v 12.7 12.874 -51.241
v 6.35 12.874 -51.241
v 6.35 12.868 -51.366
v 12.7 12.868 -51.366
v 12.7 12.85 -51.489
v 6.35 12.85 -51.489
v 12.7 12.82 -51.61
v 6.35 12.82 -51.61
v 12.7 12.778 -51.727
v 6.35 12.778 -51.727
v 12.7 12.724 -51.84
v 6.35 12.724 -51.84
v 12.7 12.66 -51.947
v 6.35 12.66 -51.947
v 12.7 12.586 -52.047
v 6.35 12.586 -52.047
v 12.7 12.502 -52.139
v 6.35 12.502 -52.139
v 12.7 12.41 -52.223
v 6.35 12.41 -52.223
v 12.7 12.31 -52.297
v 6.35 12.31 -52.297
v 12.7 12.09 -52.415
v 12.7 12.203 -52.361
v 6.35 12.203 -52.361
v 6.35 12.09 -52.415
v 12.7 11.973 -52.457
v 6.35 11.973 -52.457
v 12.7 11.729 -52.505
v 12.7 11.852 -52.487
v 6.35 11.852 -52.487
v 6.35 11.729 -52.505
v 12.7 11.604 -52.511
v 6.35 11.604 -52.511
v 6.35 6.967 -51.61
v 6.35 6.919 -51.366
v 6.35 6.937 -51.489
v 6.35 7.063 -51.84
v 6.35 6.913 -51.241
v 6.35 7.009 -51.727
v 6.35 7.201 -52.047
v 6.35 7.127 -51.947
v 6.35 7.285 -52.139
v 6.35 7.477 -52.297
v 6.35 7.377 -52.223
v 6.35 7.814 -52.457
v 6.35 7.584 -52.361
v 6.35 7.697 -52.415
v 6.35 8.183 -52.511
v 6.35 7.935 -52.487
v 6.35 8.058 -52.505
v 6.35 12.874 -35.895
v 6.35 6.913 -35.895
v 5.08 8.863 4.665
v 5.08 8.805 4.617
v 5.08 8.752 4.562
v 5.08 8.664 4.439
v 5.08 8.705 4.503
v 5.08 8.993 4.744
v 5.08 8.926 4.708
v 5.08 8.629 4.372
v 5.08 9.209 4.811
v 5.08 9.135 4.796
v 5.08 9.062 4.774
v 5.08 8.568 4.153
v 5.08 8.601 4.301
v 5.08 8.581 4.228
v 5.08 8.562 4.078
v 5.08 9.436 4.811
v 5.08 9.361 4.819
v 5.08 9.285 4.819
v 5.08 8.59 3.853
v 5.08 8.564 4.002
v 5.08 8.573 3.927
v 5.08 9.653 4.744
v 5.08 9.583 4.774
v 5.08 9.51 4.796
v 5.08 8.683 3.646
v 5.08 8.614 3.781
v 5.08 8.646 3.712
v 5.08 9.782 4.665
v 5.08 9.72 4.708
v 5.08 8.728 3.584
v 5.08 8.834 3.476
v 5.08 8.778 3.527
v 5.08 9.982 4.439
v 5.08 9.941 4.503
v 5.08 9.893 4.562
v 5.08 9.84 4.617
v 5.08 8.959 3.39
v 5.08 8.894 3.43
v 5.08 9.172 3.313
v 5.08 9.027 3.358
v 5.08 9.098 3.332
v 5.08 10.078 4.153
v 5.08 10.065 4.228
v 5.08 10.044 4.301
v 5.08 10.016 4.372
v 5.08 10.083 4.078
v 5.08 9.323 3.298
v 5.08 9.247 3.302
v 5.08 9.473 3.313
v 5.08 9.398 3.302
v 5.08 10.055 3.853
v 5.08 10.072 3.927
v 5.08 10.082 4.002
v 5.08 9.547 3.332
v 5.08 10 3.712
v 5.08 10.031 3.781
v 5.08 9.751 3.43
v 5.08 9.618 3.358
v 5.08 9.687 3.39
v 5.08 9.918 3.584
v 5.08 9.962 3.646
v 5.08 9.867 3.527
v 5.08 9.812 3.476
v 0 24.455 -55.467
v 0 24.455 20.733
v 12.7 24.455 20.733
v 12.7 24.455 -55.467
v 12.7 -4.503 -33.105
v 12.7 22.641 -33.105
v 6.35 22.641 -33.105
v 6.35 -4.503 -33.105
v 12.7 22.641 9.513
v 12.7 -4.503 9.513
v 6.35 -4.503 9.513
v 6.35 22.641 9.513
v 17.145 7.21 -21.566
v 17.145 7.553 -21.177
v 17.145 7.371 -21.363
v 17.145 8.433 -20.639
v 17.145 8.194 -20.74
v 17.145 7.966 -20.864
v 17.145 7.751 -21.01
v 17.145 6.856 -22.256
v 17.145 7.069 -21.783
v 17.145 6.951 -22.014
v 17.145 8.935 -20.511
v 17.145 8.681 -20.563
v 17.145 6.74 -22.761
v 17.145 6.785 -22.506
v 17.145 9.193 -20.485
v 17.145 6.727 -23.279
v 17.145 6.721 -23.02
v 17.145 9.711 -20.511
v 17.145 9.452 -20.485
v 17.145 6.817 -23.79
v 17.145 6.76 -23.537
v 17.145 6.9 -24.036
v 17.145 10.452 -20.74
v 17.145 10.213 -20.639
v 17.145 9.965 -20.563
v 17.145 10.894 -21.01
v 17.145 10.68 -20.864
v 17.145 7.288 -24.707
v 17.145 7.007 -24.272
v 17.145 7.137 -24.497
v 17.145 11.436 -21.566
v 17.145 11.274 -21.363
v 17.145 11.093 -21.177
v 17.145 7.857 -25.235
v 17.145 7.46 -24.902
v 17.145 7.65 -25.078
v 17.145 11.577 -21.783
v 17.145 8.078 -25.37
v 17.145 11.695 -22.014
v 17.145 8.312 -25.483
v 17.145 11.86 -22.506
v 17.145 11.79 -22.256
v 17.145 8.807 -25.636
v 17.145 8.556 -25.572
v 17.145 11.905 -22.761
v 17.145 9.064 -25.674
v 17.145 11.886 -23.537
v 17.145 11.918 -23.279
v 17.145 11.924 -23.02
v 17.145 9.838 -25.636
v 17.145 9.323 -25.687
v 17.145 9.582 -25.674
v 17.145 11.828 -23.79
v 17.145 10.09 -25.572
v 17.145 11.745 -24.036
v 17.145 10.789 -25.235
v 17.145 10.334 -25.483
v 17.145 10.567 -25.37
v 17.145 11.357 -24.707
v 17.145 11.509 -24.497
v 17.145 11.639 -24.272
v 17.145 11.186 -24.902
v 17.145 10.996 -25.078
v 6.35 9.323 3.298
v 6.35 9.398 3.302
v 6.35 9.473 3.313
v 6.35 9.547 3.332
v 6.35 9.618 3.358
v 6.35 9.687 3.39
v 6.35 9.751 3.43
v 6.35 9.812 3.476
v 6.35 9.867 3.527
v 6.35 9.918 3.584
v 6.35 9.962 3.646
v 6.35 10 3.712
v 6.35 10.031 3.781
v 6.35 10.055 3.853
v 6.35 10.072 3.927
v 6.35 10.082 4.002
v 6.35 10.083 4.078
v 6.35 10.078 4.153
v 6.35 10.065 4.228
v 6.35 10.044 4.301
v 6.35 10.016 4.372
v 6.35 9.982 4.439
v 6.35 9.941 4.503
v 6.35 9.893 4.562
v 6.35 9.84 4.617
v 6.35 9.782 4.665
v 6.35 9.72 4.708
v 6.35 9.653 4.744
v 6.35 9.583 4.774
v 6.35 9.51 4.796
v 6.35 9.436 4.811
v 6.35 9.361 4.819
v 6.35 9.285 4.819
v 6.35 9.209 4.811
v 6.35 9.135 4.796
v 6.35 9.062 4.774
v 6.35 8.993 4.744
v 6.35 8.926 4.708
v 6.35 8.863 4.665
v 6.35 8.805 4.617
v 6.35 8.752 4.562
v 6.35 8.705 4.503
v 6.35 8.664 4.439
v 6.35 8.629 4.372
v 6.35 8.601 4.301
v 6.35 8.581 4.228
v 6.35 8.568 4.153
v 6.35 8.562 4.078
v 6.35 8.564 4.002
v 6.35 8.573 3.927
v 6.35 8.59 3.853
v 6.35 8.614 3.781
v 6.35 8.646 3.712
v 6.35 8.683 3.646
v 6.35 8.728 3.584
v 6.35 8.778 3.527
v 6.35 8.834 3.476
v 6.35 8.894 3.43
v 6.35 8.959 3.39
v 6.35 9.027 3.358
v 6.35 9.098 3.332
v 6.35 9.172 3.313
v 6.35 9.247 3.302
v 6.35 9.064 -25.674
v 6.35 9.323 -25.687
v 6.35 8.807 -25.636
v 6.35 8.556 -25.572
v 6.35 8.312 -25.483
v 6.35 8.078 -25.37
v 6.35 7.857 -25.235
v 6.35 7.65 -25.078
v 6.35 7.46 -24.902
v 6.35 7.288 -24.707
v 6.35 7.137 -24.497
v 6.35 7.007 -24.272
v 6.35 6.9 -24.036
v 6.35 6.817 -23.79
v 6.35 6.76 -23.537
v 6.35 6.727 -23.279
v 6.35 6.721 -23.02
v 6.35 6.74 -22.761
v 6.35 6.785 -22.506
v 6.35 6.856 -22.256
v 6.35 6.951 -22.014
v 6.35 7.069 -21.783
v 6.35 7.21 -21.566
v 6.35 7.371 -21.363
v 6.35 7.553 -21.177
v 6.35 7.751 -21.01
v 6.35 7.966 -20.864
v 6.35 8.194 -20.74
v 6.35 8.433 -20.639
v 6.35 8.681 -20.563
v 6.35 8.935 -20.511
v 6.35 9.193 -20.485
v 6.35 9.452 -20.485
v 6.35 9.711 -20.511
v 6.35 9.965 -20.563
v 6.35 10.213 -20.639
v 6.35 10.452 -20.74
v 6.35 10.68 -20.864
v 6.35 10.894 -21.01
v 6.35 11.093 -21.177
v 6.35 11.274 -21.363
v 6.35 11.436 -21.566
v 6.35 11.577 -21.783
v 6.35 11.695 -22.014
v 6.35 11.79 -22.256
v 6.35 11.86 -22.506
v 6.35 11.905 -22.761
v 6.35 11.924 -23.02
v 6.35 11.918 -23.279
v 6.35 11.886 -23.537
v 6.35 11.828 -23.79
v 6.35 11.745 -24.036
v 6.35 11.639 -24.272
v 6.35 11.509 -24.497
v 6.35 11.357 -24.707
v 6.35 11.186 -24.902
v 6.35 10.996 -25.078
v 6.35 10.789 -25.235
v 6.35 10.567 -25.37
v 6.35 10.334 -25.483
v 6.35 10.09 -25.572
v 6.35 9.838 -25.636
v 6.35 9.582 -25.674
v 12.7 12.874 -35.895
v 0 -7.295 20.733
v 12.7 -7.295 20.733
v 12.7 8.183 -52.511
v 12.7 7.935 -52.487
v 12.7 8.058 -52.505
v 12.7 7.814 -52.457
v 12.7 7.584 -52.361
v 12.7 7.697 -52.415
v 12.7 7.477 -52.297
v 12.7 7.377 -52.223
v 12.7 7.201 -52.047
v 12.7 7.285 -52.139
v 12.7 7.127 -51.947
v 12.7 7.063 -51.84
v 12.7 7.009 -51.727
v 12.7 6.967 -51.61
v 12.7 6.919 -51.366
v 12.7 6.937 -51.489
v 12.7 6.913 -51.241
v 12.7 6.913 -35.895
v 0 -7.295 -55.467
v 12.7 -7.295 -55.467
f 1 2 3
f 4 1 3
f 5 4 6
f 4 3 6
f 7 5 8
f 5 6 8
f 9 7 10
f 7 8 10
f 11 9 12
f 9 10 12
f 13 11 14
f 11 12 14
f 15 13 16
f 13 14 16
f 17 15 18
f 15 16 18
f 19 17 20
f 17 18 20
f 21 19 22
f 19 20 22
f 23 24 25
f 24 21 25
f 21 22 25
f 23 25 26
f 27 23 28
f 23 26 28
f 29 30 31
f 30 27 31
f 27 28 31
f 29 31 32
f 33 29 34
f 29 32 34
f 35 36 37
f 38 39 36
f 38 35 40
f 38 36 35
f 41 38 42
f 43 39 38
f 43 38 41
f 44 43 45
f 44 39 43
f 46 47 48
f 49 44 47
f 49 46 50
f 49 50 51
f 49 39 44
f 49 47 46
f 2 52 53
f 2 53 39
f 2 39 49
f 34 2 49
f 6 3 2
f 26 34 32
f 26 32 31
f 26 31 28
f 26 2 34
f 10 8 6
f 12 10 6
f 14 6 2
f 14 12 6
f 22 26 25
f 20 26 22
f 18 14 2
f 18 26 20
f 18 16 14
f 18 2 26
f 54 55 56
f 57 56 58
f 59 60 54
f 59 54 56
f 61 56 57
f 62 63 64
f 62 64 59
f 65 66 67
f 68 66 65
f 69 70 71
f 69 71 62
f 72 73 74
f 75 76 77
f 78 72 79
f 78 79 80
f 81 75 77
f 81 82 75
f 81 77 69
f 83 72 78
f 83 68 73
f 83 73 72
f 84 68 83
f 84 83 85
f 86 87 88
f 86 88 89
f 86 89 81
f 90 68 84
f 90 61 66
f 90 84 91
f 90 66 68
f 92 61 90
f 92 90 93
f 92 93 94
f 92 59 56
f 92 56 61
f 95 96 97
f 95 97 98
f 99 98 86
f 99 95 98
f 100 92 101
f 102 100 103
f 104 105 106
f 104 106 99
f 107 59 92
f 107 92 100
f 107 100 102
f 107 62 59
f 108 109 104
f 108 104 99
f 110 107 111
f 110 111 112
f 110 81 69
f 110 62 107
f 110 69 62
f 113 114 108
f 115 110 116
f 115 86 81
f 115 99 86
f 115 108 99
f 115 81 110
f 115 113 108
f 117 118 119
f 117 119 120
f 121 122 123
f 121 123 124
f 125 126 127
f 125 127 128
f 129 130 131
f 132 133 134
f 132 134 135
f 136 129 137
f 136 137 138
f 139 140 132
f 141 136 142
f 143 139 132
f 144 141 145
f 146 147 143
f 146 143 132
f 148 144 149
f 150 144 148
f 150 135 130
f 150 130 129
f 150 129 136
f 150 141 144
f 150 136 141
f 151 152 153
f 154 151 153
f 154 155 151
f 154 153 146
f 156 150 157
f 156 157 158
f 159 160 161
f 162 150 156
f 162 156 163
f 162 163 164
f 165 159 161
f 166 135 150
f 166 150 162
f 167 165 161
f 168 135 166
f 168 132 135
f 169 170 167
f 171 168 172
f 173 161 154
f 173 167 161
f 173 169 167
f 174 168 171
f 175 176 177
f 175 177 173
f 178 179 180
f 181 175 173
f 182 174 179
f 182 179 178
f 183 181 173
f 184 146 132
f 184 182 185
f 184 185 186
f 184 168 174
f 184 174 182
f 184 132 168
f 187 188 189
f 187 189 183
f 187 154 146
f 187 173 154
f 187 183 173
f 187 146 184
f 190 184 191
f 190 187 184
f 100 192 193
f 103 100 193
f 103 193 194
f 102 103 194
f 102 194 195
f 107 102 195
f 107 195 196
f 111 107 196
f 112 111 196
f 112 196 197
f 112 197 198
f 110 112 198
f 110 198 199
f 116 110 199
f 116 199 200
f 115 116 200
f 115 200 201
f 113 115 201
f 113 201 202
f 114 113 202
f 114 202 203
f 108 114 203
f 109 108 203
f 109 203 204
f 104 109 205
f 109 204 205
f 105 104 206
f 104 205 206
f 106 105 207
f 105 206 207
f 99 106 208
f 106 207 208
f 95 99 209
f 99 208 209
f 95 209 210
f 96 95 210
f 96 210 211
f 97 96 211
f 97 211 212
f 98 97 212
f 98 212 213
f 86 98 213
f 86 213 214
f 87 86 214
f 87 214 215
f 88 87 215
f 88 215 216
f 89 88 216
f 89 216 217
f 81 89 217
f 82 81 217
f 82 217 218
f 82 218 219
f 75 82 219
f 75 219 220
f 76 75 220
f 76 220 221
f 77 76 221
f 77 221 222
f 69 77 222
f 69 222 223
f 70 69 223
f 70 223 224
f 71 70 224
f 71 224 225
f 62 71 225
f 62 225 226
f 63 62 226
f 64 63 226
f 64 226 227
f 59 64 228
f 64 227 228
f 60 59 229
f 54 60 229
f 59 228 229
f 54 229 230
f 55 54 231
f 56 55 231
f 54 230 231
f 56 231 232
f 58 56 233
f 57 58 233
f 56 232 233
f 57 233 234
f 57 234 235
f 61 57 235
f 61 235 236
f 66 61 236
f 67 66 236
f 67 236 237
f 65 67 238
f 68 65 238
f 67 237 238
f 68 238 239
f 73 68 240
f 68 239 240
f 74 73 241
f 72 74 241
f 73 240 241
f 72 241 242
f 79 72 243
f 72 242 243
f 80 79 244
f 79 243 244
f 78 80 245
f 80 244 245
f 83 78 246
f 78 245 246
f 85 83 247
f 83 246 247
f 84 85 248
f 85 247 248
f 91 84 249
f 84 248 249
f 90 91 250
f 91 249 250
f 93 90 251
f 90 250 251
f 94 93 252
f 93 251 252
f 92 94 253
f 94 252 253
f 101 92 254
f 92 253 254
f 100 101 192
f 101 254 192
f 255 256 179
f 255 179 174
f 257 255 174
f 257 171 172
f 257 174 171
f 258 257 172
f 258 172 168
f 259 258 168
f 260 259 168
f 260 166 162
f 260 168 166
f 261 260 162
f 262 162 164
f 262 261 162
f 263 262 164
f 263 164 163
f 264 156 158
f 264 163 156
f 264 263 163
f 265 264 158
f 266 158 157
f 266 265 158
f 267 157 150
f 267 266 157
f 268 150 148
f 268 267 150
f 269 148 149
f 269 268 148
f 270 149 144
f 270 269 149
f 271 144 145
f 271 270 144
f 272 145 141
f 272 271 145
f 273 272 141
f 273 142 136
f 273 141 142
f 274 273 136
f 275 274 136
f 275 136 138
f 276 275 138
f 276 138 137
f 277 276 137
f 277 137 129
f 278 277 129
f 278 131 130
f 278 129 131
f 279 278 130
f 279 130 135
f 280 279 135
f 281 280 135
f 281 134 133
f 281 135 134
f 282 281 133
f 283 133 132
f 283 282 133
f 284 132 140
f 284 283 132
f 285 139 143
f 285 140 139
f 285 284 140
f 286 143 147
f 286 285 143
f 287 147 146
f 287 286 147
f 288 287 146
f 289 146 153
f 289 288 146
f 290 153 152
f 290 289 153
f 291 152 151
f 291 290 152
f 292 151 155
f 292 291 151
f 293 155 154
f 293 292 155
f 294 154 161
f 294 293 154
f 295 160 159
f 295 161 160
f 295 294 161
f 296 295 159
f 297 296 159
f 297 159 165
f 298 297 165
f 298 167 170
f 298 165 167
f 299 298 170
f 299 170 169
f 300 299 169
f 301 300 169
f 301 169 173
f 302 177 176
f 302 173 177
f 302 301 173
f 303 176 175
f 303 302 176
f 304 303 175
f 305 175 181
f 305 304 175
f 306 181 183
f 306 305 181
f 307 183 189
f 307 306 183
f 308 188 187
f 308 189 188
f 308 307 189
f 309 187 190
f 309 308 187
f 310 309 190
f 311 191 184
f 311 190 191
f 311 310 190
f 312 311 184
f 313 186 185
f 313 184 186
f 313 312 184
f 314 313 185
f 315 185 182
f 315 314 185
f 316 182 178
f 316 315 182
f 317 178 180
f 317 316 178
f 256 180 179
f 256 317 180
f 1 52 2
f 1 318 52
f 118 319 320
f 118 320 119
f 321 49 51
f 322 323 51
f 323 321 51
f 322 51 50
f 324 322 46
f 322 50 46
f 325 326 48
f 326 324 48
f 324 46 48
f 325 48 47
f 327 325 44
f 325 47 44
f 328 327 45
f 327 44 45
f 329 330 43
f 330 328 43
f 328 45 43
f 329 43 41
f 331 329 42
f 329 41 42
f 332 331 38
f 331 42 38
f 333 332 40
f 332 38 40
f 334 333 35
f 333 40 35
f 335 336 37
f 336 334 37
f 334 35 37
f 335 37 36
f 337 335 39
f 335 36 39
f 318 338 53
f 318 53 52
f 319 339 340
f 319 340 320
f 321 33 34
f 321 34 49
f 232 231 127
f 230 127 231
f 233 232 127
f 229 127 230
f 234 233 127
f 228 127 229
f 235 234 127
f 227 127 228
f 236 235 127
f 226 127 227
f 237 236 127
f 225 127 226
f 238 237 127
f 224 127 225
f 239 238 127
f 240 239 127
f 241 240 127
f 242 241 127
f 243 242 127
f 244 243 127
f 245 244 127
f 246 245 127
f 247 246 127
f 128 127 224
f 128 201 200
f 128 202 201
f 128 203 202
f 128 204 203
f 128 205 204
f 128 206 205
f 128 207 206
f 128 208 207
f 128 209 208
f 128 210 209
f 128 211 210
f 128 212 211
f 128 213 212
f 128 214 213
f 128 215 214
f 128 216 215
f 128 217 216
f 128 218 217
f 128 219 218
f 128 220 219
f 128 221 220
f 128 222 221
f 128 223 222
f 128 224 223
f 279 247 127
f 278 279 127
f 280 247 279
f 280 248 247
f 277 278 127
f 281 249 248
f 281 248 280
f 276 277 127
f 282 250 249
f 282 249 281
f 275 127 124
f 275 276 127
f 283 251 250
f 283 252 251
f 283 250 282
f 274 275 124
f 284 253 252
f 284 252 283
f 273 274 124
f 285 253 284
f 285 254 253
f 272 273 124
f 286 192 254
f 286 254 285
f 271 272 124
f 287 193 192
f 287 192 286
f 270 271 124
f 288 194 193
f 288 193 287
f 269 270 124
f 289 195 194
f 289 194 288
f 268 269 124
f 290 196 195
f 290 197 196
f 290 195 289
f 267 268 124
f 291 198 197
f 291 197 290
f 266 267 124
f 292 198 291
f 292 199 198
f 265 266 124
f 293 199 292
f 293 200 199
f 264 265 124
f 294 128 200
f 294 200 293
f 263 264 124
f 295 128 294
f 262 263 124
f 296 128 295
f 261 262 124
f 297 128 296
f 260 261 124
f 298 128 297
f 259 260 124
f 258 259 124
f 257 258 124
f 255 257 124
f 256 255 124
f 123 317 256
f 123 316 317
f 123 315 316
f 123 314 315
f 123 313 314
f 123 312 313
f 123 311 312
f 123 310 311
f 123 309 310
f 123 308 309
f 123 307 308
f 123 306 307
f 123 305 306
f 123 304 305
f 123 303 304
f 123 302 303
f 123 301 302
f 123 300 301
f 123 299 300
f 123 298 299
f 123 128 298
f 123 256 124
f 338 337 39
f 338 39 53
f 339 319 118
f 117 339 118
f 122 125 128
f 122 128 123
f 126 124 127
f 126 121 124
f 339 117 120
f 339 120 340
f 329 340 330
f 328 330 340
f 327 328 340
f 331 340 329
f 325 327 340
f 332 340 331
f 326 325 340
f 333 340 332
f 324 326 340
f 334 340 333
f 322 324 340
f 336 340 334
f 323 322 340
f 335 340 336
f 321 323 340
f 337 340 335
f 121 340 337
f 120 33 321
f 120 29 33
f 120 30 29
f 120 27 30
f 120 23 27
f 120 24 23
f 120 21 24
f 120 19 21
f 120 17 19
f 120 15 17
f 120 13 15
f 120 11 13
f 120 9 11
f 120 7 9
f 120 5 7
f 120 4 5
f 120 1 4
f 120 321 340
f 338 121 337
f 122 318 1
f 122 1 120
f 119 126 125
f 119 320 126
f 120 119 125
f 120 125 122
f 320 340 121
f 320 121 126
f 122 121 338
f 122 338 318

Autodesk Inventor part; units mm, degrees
ref_plane "YZ Plane" through (0, 0, 0) normal (1, 0, 0) x (0, 1, 0)
ref_plane "XZ Plane" through (0, 0, 0) normal (0, 1, 0) x (-1, 0, 0)
ref_plane "XY Plane" through (0, 0, 0) normal (0, 0, 1) x (1, 0, 0)
sketch "Sketch1" plane through (0, 0, 0) normal (1, 0, 0) x (0, 1, 0)
  line L0 (-7.2949, 20.7328) -> (24.4551, 20.7328)
  line L1 (24.4551, 20.7328) -> (24.4551, -55.4672)
  line L2 (24.4551, -55.4672) -> (-7.2949, -55.4672)
  line L3 (-7.2949, -55.4672) -> (-7.2949, 20.7328)
  point P0 (0, 0)
  dimension "d0" = 31.75
  dimension "d1" = 76.2
extrude "Extrusion1" add sketch "Sketch1" along normal blind 12.7
sketch "Sketch2" plane through (12.7, 0, 0) normal (1, 0, 0) x (0, 0, -1)
  line L0 (-9.5129, 22.6408) -> (33.105, 22.6408)
  line L1 (33.105, 22.6408) -> (33.105, -4.5028)
  line L2 (33.105, -4.5028) -> (-9.5129, -4.5028)
  line L3 (-9.5129, -4.5028) -> (-9.5129, 22.6408)
  line L4 (35.8954, 12.8742) -> (52.5113, 12.8742)
  line L5 (52.5113, 12.8742) -> (52.5113, 6.9127)
  line L6 (52.5113, 6.9127) -> (35.8954, 6.9127)
  line L7 (35.8954, 6.9127) -> (35.8954, 12.8742)
  point P0 (0, 0)
extrude "Extrusion2" cut sketch "Sketch2" against normal blind 6.35
fillet "Fillet1" radius 1.27 2 edges at (9.525, 12.8742, -52.5113) (9.525, 6.9127, -52.5113)
sketch "Sketch3" plane through (6.35, 0, 0) normal (1, 0, 0) x (0, 0, -1)
  circle A0 centre (23.0847, 9.3227) radius 2.6025
  circle A1 centre (-4.0588, 9.3227) radius 0.761
  point P0 (0, 0)
extrude "Extrusion3" cut sketch "Sketch3" against normal blind 1.27 contours A1
extrude "Extrusion4" add sketch "Sketch3" along normal blind 10.795 contours A0
properties part number "7.2 part 1"
